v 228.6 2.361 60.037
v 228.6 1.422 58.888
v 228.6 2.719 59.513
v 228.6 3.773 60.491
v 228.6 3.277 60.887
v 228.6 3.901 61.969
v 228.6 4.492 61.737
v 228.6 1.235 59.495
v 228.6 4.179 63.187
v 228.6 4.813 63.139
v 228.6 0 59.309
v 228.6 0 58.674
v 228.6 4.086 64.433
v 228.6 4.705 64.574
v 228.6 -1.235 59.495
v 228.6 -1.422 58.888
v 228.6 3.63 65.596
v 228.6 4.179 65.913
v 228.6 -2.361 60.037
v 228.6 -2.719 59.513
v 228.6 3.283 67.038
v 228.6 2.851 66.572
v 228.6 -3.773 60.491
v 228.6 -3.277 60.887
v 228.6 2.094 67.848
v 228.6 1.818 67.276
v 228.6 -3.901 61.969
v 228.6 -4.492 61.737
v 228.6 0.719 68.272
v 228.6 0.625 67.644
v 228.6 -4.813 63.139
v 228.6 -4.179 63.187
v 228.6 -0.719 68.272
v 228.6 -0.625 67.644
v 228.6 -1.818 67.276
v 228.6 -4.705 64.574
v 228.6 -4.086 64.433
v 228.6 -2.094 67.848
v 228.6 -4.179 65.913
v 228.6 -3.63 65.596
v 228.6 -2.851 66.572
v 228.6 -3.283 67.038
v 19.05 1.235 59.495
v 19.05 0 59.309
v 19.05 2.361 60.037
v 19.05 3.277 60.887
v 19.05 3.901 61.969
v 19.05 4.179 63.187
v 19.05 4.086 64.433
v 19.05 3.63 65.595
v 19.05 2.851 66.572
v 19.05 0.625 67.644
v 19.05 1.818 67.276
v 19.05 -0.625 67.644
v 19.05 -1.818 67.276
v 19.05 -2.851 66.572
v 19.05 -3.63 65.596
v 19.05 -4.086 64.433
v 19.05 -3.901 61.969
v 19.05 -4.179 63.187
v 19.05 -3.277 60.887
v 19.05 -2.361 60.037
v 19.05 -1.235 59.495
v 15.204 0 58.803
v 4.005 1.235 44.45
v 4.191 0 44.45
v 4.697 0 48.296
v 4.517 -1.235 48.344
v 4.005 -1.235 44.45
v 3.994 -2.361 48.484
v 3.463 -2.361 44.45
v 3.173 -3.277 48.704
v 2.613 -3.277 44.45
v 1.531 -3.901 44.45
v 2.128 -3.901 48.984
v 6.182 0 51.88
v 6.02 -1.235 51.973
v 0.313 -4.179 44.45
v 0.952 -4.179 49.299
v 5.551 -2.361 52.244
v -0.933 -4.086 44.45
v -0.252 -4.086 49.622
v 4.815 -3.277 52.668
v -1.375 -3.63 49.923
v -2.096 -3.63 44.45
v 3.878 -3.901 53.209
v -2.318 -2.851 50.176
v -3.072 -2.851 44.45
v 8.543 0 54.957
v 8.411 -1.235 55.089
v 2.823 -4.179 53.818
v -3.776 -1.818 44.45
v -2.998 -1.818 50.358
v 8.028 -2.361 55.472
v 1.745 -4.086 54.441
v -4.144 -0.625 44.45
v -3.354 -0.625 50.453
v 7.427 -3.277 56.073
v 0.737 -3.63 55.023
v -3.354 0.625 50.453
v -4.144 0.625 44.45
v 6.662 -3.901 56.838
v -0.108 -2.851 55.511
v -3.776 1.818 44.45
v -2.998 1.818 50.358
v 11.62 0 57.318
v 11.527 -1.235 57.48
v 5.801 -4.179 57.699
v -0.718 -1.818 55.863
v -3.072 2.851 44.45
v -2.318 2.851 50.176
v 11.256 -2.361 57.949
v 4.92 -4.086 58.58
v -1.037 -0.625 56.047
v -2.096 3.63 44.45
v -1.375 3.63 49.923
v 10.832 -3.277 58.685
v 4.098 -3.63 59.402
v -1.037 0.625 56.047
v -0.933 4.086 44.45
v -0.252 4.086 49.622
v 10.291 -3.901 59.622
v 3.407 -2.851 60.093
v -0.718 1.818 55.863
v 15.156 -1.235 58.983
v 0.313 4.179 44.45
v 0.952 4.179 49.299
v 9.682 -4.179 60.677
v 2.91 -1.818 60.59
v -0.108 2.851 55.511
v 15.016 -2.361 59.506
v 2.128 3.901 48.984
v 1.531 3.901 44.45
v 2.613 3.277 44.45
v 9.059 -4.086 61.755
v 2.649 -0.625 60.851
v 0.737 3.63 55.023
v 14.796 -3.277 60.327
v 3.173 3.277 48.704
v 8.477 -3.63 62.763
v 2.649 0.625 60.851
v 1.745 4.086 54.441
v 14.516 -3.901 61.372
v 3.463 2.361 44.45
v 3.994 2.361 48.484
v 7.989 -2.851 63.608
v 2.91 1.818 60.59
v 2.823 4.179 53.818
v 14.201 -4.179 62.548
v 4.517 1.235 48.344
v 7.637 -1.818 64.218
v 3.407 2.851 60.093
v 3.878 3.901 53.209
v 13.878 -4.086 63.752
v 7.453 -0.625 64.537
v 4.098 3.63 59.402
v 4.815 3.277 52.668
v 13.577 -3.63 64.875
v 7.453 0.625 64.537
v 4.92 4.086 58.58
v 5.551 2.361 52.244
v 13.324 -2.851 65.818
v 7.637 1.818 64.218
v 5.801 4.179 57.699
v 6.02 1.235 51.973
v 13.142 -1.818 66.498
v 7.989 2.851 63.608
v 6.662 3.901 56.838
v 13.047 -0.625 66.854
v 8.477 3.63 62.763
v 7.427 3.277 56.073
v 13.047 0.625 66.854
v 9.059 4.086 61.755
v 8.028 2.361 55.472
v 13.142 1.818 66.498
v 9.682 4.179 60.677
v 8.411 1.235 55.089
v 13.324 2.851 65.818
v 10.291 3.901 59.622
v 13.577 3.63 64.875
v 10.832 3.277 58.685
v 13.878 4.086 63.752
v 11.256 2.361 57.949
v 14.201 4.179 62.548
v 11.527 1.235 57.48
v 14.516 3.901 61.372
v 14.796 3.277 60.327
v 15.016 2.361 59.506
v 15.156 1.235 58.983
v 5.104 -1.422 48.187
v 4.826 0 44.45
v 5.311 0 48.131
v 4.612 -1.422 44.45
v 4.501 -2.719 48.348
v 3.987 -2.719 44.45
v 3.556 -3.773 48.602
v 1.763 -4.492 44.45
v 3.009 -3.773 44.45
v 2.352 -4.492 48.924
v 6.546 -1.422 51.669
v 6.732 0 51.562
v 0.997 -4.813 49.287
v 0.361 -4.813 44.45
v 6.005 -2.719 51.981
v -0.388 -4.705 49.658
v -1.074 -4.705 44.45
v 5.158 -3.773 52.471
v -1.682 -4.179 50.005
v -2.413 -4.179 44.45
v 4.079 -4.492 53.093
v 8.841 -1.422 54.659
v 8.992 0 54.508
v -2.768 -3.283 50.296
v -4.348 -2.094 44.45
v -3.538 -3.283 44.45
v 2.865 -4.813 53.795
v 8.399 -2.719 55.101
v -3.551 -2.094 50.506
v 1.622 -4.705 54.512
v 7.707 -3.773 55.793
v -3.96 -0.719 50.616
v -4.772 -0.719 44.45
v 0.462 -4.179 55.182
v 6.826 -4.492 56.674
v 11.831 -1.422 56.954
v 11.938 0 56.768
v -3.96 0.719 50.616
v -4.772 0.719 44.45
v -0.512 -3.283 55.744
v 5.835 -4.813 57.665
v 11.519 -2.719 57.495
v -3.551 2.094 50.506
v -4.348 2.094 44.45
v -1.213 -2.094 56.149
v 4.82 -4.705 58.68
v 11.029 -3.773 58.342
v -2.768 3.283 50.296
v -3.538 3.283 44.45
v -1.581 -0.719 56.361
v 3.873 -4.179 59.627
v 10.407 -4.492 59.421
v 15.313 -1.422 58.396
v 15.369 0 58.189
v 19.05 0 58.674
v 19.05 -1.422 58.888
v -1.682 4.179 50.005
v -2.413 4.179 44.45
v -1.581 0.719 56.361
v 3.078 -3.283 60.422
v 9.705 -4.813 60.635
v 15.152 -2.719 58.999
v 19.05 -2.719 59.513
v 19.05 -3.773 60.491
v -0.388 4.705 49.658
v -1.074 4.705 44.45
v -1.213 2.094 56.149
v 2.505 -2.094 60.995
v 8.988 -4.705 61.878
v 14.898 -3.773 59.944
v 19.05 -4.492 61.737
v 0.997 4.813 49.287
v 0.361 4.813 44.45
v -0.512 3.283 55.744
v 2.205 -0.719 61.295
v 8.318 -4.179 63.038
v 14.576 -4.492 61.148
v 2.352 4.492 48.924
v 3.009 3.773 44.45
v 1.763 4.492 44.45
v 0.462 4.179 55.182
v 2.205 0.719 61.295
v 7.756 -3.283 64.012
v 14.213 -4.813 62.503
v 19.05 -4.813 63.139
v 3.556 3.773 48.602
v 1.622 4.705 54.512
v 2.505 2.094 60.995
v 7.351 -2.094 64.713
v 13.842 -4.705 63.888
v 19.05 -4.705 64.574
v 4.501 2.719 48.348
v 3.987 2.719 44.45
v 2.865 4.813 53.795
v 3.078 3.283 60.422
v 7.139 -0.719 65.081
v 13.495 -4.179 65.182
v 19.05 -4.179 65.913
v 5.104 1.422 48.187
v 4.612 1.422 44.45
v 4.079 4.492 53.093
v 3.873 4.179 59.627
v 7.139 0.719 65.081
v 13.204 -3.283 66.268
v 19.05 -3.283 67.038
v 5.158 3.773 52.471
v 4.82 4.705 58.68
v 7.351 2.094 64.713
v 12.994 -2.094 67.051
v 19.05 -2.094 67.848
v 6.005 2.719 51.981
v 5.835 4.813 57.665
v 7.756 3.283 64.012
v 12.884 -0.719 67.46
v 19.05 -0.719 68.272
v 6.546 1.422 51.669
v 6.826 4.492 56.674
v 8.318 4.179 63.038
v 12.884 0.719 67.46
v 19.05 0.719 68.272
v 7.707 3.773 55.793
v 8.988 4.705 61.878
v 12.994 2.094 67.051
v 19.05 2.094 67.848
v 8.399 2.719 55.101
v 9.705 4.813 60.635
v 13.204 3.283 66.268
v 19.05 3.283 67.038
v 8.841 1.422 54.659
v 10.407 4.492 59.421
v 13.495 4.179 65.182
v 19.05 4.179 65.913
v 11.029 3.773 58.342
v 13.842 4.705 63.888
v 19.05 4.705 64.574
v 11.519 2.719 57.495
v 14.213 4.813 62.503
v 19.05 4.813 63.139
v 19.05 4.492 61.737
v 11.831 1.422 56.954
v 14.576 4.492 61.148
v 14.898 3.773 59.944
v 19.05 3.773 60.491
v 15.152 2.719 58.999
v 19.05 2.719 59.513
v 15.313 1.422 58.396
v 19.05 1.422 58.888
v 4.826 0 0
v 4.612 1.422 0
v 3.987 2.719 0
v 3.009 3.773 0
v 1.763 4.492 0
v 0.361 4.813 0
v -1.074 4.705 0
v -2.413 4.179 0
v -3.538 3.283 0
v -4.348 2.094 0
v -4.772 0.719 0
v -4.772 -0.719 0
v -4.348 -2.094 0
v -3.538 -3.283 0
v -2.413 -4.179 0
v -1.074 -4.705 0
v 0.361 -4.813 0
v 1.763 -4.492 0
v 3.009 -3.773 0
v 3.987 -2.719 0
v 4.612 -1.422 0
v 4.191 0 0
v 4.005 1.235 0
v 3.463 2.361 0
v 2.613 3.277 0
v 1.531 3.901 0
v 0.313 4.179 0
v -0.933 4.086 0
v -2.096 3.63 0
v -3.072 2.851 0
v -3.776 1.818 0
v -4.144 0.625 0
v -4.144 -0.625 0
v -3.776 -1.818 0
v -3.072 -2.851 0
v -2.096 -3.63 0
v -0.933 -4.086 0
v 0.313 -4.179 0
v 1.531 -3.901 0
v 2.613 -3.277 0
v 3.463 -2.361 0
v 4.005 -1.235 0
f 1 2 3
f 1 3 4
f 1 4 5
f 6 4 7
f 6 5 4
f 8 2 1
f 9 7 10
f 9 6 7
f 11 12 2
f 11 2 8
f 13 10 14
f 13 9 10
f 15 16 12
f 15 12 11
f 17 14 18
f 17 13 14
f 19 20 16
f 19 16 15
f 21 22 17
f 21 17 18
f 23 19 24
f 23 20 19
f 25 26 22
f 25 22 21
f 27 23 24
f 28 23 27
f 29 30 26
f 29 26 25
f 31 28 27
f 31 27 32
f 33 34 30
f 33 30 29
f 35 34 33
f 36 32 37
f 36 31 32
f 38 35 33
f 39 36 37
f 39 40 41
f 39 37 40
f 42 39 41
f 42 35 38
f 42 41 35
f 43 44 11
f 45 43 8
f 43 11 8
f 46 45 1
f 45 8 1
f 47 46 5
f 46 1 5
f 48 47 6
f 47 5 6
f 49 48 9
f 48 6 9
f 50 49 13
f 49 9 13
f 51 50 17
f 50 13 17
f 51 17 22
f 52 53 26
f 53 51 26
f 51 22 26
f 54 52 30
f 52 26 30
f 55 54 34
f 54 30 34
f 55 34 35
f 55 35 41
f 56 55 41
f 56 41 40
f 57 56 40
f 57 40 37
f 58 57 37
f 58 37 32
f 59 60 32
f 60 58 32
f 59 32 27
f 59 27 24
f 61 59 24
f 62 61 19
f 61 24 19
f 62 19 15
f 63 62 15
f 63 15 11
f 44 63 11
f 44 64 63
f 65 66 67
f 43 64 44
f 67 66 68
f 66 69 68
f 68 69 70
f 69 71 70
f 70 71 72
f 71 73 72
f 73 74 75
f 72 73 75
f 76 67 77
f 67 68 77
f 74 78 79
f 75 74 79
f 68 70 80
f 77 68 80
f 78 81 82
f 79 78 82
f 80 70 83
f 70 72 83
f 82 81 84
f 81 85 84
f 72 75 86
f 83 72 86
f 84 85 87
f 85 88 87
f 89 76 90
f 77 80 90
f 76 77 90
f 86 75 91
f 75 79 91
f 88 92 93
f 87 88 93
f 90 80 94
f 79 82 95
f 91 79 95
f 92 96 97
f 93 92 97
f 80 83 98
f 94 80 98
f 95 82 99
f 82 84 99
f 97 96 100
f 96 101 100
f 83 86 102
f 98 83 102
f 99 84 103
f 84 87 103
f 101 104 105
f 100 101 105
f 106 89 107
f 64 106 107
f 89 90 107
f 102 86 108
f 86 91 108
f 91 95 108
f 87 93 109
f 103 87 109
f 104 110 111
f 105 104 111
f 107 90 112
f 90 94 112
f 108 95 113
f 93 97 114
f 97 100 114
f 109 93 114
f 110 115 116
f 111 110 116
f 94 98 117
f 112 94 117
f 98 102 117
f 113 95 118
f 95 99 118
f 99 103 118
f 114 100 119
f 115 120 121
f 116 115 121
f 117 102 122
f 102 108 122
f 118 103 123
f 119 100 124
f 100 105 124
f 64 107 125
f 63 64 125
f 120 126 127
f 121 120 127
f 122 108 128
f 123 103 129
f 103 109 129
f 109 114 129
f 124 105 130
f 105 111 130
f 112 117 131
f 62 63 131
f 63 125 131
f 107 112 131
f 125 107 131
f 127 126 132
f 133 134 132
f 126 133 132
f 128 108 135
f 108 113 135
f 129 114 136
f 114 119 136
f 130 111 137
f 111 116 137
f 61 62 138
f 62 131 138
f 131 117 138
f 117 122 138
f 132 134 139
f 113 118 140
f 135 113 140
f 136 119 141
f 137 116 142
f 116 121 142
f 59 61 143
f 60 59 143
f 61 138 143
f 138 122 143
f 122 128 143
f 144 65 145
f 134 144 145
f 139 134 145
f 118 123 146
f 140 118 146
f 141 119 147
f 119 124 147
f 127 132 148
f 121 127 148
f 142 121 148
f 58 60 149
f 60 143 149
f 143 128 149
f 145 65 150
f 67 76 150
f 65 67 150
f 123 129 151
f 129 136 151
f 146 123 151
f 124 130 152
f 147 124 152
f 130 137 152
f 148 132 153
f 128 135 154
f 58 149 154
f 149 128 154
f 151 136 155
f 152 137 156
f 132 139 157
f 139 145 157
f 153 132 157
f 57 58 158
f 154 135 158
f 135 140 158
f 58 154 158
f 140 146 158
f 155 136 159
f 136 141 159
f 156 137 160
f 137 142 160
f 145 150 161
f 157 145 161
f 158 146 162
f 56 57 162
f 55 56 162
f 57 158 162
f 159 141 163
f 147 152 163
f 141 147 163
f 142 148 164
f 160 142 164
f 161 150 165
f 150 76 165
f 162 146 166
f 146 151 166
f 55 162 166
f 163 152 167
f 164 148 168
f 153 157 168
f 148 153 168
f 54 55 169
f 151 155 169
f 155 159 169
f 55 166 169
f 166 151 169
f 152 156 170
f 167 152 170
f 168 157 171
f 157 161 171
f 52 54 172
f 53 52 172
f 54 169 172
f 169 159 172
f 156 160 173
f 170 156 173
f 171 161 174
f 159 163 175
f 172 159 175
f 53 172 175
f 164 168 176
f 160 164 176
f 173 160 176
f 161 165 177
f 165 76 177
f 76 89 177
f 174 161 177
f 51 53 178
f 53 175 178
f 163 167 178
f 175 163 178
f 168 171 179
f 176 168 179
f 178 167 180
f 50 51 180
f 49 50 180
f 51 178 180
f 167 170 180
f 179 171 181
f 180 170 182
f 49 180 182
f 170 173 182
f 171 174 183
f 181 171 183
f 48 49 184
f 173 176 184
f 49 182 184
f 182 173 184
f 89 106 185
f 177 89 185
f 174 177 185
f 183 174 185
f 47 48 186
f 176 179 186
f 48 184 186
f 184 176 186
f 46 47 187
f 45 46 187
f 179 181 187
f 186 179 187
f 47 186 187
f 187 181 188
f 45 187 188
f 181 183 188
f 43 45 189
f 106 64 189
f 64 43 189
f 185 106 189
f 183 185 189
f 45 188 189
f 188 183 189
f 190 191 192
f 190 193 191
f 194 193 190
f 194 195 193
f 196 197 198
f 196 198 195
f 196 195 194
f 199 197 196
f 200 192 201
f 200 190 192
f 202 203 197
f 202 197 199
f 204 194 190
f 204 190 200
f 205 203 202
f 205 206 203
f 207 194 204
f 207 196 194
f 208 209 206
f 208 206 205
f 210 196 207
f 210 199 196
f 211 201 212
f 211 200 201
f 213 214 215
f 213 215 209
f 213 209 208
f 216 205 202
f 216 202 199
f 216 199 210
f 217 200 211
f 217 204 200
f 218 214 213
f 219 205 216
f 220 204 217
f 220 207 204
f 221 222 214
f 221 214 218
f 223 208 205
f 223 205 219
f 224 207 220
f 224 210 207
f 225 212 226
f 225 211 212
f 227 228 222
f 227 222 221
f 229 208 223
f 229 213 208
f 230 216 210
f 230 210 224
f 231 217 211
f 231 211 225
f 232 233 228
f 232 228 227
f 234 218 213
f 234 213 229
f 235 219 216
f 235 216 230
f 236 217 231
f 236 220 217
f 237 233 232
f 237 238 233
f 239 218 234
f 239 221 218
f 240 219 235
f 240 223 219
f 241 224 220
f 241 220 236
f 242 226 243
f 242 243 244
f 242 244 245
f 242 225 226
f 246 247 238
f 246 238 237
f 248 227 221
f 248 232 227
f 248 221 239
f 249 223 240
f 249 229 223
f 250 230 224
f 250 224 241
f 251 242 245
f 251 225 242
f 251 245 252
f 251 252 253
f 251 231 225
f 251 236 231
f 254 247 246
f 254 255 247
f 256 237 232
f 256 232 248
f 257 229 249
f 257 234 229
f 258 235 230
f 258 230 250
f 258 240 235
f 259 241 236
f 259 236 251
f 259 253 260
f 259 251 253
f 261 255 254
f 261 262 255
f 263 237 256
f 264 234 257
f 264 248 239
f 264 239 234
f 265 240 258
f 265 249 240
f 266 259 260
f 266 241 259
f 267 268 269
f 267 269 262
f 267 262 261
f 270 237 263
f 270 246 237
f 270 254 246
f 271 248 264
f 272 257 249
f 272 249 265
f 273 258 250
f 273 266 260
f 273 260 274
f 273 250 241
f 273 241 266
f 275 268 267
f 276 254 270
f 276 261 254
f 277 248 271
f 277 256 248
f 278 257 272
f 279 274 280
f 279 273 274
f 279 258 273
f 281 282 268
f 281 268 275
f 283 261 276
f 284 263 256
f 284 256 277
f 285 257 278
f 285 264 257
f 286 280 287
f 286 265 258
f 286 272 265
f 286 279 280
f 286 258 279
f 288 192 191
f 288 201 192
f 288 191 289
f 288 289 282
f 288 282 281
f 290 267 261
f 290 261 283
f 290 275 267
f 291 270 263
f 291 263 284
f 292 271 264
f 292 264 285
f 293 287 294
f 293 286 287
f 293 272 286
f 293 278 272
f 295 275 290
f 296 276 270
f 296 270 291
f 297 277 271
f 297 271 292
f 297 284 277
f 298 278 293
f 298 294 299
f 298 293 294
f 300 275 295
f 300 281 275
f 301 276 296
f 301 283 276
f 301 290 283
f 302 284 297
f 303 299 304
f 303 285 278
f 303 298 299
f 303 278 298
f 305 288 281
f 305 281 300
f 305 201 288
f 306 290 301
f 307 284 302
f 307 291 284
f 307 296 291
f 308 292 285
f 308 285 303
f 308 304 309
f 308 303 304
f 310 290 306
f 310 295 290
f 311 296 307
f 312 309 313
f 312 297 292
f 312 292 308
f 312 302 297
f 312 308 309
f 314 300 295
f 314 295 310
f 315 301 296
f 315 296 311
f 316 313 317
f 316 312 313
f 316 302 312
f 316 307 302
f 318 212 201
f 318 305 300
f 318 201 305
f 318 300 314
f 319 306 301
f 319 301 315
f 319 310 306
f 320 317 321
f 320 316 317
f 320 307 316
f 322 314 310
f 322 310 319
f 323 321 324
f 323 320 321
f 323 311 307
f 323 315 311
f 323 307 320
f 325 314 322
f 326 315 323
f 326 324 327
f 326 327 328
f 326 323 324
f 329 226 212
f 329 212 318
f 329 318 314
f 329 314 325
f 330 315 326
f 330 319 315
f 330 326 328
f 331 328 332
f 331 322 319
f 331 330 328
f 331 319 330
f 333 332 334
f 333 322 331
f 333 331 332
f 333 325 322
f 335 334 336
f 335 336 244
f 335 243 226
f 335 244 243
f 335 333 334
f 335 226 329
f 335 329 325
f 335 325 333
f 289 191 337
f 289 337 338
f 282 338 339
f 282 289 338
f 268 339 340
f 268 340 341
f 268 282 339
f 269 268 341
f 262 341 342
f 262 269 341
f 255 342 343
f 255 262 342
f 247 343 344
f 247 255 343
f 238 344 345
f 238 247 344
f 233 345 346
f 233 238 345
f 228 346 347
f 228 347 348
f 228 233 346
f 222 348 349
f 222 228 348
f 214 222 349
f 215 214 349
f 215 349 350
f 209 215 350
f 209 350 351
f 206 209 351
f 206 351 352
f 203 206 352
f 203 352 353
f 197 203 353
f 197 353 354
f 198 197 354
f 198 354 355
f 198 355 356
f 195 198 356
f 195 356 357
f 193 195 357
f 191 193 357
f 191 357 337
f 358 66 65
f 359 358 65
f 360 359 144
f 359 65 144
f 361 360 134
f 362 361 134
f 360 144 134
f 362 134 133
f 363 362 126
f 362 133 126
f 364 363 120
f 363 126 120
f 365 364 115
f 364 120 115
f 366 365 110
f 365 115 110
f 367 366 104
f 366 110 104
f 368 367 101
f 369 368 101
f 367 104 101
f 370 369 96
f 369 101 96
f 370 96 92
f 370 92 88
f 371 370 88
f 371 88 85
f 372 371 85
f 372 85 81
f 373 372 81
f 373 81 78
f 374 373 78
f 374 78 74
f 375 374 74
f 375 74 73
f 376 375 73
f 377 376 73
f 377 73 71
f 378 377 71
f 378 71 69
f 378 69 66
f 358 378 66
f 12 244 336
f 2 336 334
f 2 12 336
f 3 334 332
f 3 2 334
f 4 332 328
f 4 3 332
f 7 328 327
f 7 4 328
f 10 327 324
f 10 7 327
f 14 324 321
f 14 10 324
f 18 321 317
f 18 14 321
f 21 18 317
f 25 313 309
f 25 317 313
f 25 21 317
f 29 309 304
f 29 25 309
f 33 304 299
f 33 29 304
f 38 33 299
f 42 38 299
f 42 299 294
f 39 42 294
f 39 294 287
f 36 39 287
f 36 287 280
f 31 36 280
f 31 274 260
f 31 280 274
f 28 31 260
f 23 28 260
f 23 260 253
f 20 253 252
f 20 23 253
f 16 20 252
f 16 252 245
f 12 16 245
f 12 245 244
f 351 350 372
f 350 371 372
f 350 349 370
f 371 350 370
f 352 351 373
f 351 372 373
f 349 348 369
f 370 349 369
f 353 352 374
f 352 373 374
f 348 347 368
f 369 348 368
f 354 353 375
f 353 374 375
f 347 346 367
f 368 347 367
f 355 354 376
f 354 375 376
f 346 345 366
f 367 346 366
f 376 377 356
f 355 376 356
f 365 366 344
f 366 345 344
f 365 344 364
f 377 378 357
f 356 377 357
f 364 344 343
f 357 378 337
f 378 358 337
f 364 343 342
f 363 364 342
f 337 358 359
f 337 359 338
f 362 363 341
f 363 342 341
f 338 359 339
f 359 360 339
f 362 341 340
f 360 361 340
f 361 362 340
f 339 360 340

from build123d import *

# Parameters (mm, degrees)
SKETCH1_R   = 4.826
SKETCH1_R_2 = 4.191


with BuildPart() as part:
    # Sweep1: sweep along a curve in space
    with BuildLine() as sweep1_path:
        Line((0, 0, 0), (0, 0, 44.45))
        ThreePointArc((0, 0, 44.45), (5.579615818, 0, 57.920384182), (19.05, 0, 63.5))
        Line((19.05, 0, 63.5), (228.6, 0, 63.5))
    # Sketch1 → Sweep1 (sweep)
    with BuildSketch(Plane.XY):
        Circle(SKETCH1_R)
        Circle(SKETCH1_R_2, mode=Mode.SUBTRACT)
    sweep(path=sweep1_path.line)


solid = part.part
